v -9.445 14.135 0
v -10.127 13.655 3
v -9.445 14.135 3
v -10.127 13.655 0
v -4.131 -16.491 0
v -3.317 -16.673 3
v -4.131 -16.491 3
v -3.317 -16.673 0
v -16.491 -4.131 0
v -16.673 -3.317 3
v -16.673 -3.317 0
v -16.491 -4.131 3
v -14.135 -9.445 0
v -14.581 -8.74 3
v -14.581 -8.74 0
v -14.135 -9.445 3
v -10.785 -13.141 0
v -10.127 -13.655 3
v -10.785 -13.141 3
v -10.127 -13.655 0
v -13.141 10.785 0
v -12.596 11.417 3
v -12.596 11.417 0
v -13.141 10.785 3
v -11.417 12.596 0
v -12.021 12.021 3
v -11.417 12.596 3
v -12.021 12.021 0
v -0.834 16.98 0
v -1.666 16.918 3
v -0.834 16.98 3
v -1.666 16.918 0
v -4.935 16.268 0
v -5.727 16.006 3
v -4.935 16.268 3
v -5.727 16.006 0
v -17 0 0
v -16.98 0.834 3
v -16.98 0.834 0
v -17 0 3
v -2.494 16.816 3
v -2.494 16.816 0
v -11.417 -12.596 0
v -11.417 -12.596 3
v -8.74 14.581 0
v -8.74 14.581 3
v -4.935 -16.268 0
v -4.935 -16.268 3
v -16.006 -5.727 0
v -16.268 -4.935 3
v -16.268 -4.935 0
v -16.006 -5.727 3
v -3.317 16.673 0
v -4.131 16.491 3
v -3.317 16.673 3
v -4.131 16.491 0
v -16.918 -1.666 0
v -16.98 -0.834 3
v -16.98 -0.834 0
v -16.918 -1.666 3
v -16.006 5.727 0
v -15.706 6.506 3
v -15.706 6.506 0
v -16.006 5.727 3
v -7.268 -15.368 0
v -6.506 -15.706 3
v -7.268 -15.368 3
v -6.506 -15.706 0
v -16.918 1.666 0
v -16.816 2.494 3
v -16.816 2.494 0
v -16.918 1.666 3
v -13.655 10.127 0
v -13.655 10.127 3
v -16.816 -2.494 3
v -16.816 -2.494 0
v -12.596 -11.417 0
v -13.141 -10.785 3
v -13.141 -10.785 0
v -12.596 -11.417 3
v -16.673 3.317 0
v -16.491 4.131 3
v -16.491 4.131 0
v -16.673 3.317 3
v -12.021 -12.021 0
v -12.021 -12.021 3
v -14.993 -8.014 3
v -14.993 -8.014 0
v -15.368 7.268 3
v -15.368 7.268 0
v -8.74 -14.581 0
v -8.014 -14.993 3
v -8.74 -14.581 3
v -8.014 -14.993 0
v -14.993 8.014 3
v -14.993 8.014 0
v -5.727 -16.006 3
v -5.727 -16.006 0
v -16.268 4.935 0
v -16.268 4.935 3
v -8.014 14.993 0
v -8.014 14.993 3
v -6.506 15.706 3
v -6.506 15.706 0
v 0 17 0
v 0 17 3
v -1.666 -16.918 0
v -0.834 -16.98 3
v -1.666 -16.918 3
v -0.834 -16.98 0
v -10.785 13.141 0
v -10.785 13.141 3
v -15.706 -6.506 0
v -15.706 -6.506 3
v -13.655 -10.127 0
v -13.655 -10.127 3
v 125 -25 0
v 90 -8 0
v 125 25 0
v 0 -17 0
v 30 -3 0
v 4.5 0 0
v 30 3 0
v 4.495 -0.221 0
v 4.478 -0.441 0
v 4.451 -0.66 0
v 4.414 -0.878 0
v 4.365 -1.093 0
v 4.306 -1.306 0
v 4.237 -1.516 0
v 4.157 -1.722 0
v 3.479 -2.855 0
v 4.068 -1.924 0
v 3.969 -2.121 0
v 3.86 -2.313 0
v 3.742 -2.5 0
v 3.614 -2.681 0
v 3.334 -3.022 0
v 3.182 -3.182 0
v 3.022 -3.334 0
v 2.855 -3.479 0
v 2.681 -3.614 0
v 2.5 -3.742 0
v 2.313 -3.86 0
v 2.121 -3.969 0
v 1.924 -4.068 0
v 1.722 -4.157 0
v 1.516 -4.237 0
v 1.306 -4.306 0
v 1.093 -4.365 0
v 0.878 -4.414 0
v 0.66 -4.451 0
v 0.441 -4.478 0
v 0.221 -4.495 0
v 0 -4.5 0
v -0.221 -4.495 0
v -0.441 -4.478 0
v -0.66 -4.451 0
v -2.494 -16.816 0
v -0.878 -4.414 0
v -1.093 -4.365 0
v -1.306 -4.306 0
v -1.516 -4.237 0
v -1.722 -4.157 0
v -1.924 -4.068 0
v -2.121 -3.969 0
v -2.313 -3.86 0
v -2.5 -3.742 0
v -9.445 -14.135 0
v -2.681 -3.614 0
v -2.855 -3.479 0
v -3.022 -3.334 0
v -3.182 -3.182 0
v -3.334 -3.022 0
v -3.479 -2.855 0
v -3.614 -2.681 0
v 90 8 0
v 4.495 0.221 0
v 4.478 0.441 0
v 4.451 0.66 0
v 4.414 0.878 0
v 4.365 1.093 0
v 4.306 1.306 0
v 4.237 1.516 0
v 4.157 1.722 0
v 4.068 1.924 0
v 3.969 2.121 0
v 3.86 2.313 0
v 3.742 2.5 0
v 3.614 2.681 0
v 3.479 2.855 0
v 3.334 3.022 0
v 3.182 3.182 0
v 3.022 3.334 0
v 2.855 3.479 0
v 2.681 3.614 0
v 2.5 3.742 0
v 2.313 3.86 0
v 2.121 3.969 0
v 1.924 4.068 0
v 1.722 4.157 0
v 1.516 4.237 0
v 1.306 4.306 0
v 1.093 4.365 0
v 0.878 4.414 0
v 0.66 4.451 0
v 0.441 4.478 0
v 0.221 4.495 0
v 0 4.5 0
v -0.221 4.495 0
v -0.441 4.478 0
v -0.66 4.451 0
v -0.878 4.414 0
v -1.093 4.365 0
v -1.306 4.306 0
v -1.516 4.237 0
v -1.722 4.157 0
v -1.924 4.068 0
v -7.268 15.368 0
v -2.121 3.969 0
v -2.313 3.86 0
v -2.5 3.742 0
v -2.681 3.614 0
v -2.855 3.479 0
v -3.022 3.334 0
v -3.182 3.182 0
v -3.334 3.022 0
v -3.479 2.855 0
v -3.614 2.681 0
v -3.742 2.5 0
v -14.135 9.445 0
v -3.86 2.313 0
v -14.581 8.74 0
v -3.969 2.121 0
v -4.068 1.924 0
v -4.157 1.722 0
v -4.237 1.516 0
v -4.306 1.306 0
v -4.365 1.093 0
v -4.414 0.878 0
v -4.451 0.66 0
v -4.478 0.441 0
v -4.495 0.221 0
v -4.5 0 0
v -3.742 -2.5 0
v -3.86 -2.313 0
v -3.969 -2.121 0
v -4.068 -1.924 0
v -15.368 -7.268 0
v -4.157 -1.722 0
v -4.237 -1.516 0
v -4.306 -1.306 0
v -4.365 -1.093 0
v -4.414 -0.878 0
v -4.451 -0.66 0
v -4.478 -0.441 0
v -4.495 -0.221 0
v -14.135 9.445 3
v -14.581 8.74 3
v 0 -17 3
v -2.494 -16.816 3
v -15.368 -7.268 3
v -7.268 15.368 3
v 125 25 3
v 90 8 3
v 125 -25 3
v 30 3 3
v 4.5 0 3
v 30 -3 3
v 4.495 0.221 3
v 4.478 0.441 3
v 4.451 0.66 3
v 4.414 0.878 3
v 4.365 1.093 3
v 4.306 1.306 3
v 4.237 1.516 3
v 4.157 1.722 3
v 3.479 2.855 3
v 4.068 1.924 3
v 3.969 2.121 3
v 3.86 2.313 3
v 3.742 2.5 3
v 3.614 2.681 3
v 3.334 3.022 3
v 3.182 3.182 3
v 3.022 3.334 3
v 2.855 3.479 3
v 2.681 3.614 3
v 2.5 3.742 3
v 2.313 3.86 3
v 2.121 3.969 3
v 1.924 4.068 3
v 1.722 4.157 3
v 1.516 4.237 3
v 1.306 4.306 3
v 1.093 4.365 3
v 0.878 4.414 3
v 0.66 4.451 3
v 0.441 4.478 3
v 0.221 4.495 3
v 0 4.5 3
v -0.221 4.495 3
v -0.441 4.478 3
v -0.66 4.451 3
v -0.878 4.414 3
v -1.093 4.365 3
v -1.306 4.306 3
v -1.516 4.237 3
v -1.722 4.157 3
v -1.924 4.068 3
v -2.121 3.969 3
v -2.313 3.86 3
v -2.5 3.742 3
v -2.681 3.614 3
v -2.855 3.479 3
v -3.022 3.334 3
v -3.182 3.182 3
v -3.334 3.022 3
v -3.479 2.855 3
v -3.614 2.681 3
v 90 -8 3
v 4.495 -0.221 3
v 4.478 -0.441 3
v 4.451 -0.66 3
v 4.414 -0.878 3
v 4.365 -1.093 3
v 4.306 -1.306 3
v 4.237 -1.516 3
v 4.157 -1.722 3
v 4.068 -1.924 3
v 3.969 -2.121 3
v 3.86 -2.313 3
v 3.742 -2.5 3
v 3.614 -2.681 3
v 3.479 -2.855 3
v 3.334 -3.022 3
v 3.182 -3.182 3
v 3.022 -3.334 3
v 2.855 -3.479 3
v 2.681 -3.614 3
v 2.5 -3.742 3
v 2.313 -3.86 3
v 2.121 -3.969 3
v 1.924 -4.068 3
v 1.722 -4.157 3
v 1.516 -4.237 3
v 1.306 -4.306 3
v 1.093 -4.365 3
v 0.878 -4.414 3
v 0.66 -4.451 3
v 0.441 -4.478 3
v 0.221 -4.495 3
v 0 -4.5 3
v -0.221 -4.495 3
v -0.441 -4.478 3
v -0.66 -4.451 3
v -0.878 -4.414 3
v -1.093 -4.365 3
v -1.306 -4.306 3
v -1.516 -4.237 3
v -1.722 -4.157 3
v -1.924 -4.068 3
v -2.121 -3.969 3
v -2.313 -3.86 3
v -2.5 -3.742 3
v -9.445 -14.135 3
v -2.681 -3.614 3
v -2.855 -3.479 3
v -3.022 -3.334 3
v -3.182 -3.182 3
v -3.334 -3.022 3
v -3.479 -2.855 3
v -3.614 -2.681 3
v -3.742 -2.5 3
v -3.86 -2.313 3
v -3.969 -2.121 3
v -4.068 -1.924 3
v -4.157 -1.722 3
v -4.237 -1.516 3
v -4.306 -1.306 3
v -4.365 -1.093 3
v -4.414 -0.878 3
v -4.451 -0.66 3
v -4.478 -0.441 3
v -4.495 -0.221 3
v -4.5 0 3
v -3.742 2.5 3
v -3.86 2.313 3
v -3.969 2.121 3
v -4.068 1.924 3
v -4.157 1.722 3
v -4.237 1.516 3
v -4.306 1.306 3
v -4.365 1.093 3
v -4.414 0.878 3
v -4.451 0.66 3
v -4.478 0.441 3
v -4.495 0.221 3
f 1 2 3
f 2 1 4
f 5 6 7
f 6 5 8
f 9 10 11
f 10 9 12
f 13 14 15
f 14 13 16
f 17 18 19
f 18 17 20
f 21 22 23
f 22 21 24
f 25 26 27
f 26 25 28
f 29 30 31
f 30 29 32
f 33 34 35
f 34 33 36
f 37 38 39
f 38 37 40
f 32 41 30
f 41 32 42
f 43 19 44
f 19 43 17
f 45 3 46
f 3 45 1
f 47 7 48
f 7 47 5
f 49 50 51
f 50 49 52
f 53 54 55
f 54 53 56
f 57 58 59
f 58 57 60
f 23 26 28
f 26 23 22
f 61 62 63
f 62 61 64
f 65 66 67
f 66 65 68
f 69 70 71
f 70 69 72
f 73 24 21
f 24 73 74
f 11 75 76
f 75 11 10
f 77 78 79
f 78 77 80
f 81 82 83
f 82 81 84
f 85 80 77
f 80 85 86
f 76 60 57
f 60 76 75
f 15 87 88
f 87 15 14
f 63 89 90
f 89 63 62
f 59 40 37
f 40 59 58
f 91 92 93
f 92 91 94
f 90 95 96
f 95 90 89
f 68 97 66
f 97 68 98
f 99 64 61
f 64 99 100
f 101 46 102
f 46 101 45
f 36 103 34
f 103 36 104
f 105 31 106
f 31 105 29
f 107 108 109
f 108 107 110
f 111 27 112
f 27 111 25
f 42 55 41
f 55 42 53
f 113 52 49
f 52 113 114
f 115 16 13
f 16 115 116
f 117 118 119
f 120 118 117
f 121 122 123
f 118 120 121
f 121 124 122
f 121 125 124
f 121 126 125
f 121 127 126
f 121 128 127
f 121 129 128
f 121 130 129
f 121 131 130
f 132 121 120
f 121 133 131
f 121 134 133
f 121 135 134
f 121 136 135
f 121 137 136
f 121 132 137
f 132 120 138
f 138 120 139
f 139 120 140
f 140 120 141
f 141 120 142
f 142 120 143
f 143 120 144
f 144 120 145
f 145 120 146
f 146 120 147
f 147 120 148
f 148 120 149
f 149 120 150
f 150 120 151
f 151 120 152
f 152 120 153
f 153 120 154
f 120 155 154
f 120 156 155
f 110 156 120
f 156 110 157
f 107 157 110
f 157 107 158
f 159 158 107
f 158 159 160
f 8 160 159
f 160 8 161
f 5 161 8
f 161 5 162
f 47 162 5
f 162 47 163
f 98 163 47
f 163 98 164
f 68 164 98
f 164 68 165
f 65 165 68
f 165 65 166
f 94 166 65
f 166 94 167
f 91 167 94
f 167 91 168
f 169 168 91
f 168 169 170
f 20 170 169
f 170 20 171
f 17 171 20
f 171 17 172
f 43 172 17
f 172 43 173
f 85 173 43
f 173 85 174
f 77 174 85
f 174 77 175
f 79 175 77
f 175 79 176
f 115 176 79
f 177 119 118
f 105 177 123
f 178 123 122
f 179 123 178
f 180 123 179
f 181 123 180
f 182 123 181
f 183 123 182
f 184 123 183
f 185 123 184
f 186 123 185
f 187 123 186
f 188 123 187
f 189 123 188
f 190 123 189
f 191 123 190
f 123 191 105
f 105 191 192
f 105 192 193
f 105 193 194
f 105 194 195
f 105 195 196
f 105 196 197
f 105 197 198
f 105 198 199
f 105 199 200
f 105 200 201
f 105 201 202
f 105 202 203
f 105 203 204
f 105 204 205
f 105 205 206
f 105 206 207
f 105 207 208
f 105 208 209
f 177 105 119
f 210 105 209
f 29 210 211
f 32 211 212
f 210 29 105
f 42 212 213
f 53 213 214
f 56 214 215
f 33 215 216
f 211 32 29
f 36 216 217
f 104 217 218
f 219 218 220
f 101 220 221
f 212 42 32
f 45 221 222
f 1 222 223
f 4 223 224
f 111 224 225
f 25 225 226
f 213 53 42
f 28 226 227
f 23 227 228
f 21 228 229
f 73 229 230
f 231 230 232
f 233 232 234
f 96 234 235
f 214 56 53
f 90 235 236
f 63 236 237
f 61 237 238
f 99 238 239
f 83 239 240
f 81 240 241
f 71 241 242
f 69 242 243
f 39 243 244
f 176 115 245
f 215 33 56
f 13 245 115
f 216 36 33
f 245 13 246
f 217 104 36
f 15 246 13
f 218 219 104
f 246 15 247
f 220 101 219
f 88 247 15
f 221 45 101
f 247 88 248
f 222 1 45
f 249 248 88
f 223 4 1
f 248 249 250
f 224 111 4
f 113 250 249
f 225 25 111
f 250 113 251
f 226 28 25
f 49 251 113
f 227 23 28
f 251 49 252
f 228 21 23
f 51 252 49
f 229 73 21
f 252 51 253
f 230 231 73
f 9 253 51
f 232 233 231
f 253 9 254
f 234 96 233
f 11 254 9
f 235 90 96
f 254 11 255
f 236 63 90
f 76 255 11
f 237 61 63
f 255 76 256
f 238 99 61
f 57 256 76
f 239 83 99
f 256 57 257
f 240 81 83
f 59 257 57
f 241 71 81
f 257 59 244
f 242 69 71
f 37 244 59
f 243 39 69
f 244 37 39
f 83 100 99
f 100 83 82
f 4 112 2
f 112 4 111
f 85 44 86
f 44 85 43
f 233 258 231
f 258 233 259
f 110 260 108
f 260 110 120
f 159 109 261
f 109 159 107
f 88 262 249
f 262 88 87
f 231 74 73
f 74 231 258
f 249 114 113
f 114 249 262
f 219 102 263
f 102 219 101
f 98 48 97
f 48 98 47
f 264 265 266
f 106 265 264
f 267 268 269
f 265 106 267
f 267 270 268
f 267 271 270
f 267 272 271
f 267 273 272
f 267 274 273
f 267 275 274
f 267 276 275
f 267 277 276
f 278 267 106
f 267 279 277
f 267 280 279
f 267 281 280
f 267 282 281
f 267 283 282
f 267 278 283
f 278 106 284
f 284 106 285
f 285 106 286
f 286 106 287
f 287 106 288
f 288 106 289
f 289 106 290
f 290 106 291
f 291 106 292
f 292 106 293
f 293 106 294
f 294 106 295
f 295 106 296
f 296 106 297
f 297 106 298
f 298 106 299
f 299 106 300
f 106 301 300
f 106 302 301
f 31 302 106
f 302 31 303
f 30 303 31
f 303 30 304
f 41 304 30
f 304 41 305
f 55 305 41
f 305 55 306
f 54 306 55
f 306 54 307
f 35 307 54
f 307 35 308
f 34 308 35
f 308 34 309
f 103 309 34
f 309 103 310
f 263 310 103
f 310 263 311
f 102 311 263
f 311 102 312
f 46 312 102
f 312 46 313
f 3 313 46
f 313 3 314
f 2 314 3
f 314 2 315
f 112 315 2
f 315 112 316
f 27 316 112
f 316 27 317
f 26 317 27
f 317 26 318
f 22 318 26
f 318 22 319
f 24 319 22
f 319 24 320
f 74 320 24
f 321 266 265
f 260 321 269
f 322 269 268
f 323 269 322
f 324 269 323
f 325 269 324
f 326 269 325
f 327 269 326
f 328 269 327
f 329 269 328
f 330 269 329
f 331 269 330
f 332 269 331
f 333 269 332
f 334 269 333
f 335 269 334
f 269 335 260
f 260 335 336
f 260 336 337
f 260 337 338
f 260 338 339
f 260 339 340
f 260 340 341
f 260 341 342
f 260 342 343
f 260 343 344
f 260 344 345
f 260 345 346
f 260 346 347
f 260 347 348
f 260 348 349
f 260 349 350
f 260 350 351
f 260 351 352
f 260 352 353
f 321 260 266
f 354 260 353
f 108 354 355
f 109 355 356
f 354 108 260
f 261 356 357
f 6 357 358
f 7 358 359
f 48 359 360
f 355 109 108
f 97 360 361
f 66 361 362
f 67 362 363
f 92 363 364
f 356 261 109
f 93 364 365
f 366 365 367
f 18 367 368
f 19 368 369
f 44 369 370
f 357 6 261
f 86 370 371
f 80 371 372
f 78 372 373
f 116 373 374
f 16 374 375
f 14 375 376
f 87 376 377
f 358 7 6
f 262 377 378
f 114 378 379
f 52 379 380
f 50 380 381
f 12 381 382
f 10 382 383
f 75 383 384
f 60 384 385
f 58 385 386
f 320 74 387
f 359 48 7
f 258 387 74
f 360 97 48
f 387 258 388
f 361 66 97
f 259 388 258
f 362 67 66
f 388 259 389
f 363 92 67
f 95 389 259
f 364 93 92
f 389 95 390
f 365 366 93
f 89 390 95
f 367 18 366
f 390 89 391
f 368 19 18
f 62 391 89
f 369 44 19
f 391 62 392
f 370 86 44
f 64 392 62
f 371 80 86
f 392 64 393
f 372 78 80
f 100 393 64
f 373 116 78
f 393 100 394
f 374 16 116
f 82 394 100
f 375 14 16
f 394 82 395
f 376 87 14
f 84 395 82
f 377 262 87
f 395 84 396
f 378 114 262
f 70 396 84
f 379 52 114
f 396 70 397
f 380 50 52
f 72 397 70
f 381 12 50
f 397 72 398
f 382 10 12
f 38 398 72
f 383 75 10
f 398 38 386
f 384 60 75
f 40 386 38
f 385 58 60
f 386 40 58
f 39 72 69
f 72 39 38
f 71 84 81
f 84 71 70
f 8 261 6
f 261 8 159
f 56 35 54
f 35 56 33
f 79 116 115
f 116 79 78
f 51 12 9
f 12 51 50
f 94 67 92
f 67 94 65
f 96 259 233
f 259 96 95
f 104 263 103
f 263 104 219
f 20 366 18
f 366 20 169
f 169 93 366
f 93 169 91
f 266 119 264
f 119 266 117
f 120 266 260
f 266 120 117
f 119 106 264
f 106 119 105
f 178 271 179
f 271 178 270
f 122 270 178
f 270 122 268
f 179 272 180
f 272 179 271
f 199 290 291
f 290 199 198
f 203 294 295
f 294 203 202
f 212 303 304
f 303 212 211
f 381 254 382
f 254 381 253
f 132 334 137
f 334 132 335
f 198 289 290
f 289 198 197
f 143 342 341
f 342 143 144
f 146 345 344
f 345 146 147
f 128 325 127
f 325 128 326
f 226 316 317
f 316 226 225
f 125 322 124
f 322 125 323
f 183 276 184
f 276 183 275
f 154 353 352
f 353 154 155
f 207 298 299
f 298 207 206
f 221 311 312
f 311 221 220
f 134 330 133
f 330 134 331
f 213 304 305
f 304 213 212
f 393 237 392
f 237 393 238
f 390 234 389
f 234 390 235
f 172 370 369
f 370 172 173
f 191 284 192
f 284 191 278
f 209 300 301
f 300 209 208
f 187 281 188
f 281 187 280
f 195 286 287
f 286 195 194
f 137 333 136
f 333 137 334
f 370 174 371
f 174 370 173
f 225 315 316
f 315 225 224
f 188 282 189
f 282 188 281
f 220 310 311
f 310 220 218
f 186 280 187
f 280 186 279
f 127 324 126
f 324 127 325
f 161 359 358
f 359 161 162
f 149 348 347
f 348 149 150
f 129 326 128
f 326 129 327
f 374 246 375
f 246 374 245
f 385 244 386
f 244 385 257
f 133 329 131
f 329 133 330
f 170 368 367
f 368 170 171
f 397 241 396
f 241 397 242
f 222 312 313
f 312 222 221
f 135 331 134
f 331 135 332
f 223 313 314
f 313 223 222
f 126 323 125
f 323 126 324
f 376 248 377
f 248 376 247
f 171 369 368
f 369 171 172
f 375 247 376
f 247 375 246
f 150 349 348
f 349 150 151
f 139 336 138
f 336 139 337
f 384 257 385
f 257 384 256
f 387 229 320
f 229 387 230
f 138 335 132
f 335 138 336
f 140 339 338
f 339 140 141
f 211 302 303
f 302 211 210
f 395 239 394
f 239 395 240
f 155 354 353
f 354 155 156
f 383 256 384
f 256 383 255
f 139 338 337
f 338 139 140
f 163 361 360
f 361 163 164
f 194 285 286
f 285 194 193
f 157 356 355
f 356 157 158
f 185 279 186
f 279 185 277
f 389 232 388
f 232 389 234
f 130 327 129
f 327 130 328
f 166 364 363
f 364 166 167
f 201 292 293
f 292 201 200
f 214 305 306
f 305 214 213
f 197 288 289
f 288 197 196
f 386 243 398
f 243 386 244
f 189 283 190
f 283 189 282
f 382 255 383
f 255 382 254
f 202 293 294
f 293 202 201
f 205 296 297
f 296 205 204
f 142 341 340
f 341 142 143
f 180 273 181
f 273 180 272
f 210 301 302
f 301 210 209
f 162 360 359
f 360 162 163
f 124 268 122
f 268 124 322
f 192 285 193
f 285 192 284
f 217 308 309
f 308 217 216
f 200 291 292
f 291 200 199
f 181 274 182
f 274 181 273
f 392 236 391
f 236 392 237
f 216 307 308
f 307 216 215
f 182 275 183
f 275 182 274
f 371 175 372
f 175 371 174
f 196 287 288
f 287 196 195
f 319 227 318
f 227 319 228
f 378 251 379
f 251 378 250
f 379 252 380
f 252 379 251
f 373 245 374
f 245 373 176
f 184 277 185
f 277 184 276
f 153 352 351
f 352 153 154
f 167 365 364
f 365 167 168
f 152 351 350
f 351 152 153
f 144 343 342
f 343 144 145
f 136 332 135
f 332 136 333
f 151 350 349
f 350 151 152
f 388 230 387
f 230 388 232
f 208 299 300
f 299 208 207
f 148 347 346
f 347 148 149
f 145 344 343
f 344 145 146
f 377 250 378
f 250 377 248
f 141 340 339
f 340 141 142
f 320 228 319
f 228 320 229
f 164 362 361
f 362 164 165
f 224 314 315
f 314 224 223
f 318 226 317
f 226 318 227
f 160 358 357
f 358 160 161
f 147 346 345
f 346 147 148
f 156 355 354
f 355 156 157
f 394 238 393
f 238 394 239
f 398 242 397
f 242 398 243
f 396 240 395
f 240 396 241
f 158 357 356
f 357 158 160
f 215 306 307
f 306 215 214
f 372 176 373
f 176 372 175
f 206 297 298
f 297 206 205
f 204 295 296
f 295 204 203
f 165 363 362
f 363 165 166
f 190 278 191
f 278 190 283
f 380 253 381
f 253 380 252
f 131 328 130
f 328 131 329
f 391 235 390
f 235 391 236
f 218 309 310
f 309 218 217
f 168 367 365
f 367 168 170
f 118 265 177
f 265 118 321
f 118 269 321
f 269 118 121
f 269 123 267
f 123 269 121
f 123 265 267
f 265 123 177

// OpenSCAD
//odleglosc sruby kola 15mm
//poczatek otworu na silnik od strony uchwytu kola 45mm
//koniec 105
//min szerokosc 6mm
//max szertokosc 16mm
width=34; //koncowka od strony kola
length=125;
top_width=50;

difference() {
    union() {
        cylinder(d=width, h=3, $fn=128);
        linear_extrude(height=3)
            polygon(points=[[0,-width/2], [length,(-top_width/2)], [length,(top_width/2)] , [0,width/2]]);
    }

    translate([0,0,-0.1]) cylinder(d=9, h=3.2, $fn=128);

    translate([30,0,-0.1]) linear_extrude(height=3.2)
                polygon(points=[[0,-3], [60,-8], [60,8], [0,3]]);
}
